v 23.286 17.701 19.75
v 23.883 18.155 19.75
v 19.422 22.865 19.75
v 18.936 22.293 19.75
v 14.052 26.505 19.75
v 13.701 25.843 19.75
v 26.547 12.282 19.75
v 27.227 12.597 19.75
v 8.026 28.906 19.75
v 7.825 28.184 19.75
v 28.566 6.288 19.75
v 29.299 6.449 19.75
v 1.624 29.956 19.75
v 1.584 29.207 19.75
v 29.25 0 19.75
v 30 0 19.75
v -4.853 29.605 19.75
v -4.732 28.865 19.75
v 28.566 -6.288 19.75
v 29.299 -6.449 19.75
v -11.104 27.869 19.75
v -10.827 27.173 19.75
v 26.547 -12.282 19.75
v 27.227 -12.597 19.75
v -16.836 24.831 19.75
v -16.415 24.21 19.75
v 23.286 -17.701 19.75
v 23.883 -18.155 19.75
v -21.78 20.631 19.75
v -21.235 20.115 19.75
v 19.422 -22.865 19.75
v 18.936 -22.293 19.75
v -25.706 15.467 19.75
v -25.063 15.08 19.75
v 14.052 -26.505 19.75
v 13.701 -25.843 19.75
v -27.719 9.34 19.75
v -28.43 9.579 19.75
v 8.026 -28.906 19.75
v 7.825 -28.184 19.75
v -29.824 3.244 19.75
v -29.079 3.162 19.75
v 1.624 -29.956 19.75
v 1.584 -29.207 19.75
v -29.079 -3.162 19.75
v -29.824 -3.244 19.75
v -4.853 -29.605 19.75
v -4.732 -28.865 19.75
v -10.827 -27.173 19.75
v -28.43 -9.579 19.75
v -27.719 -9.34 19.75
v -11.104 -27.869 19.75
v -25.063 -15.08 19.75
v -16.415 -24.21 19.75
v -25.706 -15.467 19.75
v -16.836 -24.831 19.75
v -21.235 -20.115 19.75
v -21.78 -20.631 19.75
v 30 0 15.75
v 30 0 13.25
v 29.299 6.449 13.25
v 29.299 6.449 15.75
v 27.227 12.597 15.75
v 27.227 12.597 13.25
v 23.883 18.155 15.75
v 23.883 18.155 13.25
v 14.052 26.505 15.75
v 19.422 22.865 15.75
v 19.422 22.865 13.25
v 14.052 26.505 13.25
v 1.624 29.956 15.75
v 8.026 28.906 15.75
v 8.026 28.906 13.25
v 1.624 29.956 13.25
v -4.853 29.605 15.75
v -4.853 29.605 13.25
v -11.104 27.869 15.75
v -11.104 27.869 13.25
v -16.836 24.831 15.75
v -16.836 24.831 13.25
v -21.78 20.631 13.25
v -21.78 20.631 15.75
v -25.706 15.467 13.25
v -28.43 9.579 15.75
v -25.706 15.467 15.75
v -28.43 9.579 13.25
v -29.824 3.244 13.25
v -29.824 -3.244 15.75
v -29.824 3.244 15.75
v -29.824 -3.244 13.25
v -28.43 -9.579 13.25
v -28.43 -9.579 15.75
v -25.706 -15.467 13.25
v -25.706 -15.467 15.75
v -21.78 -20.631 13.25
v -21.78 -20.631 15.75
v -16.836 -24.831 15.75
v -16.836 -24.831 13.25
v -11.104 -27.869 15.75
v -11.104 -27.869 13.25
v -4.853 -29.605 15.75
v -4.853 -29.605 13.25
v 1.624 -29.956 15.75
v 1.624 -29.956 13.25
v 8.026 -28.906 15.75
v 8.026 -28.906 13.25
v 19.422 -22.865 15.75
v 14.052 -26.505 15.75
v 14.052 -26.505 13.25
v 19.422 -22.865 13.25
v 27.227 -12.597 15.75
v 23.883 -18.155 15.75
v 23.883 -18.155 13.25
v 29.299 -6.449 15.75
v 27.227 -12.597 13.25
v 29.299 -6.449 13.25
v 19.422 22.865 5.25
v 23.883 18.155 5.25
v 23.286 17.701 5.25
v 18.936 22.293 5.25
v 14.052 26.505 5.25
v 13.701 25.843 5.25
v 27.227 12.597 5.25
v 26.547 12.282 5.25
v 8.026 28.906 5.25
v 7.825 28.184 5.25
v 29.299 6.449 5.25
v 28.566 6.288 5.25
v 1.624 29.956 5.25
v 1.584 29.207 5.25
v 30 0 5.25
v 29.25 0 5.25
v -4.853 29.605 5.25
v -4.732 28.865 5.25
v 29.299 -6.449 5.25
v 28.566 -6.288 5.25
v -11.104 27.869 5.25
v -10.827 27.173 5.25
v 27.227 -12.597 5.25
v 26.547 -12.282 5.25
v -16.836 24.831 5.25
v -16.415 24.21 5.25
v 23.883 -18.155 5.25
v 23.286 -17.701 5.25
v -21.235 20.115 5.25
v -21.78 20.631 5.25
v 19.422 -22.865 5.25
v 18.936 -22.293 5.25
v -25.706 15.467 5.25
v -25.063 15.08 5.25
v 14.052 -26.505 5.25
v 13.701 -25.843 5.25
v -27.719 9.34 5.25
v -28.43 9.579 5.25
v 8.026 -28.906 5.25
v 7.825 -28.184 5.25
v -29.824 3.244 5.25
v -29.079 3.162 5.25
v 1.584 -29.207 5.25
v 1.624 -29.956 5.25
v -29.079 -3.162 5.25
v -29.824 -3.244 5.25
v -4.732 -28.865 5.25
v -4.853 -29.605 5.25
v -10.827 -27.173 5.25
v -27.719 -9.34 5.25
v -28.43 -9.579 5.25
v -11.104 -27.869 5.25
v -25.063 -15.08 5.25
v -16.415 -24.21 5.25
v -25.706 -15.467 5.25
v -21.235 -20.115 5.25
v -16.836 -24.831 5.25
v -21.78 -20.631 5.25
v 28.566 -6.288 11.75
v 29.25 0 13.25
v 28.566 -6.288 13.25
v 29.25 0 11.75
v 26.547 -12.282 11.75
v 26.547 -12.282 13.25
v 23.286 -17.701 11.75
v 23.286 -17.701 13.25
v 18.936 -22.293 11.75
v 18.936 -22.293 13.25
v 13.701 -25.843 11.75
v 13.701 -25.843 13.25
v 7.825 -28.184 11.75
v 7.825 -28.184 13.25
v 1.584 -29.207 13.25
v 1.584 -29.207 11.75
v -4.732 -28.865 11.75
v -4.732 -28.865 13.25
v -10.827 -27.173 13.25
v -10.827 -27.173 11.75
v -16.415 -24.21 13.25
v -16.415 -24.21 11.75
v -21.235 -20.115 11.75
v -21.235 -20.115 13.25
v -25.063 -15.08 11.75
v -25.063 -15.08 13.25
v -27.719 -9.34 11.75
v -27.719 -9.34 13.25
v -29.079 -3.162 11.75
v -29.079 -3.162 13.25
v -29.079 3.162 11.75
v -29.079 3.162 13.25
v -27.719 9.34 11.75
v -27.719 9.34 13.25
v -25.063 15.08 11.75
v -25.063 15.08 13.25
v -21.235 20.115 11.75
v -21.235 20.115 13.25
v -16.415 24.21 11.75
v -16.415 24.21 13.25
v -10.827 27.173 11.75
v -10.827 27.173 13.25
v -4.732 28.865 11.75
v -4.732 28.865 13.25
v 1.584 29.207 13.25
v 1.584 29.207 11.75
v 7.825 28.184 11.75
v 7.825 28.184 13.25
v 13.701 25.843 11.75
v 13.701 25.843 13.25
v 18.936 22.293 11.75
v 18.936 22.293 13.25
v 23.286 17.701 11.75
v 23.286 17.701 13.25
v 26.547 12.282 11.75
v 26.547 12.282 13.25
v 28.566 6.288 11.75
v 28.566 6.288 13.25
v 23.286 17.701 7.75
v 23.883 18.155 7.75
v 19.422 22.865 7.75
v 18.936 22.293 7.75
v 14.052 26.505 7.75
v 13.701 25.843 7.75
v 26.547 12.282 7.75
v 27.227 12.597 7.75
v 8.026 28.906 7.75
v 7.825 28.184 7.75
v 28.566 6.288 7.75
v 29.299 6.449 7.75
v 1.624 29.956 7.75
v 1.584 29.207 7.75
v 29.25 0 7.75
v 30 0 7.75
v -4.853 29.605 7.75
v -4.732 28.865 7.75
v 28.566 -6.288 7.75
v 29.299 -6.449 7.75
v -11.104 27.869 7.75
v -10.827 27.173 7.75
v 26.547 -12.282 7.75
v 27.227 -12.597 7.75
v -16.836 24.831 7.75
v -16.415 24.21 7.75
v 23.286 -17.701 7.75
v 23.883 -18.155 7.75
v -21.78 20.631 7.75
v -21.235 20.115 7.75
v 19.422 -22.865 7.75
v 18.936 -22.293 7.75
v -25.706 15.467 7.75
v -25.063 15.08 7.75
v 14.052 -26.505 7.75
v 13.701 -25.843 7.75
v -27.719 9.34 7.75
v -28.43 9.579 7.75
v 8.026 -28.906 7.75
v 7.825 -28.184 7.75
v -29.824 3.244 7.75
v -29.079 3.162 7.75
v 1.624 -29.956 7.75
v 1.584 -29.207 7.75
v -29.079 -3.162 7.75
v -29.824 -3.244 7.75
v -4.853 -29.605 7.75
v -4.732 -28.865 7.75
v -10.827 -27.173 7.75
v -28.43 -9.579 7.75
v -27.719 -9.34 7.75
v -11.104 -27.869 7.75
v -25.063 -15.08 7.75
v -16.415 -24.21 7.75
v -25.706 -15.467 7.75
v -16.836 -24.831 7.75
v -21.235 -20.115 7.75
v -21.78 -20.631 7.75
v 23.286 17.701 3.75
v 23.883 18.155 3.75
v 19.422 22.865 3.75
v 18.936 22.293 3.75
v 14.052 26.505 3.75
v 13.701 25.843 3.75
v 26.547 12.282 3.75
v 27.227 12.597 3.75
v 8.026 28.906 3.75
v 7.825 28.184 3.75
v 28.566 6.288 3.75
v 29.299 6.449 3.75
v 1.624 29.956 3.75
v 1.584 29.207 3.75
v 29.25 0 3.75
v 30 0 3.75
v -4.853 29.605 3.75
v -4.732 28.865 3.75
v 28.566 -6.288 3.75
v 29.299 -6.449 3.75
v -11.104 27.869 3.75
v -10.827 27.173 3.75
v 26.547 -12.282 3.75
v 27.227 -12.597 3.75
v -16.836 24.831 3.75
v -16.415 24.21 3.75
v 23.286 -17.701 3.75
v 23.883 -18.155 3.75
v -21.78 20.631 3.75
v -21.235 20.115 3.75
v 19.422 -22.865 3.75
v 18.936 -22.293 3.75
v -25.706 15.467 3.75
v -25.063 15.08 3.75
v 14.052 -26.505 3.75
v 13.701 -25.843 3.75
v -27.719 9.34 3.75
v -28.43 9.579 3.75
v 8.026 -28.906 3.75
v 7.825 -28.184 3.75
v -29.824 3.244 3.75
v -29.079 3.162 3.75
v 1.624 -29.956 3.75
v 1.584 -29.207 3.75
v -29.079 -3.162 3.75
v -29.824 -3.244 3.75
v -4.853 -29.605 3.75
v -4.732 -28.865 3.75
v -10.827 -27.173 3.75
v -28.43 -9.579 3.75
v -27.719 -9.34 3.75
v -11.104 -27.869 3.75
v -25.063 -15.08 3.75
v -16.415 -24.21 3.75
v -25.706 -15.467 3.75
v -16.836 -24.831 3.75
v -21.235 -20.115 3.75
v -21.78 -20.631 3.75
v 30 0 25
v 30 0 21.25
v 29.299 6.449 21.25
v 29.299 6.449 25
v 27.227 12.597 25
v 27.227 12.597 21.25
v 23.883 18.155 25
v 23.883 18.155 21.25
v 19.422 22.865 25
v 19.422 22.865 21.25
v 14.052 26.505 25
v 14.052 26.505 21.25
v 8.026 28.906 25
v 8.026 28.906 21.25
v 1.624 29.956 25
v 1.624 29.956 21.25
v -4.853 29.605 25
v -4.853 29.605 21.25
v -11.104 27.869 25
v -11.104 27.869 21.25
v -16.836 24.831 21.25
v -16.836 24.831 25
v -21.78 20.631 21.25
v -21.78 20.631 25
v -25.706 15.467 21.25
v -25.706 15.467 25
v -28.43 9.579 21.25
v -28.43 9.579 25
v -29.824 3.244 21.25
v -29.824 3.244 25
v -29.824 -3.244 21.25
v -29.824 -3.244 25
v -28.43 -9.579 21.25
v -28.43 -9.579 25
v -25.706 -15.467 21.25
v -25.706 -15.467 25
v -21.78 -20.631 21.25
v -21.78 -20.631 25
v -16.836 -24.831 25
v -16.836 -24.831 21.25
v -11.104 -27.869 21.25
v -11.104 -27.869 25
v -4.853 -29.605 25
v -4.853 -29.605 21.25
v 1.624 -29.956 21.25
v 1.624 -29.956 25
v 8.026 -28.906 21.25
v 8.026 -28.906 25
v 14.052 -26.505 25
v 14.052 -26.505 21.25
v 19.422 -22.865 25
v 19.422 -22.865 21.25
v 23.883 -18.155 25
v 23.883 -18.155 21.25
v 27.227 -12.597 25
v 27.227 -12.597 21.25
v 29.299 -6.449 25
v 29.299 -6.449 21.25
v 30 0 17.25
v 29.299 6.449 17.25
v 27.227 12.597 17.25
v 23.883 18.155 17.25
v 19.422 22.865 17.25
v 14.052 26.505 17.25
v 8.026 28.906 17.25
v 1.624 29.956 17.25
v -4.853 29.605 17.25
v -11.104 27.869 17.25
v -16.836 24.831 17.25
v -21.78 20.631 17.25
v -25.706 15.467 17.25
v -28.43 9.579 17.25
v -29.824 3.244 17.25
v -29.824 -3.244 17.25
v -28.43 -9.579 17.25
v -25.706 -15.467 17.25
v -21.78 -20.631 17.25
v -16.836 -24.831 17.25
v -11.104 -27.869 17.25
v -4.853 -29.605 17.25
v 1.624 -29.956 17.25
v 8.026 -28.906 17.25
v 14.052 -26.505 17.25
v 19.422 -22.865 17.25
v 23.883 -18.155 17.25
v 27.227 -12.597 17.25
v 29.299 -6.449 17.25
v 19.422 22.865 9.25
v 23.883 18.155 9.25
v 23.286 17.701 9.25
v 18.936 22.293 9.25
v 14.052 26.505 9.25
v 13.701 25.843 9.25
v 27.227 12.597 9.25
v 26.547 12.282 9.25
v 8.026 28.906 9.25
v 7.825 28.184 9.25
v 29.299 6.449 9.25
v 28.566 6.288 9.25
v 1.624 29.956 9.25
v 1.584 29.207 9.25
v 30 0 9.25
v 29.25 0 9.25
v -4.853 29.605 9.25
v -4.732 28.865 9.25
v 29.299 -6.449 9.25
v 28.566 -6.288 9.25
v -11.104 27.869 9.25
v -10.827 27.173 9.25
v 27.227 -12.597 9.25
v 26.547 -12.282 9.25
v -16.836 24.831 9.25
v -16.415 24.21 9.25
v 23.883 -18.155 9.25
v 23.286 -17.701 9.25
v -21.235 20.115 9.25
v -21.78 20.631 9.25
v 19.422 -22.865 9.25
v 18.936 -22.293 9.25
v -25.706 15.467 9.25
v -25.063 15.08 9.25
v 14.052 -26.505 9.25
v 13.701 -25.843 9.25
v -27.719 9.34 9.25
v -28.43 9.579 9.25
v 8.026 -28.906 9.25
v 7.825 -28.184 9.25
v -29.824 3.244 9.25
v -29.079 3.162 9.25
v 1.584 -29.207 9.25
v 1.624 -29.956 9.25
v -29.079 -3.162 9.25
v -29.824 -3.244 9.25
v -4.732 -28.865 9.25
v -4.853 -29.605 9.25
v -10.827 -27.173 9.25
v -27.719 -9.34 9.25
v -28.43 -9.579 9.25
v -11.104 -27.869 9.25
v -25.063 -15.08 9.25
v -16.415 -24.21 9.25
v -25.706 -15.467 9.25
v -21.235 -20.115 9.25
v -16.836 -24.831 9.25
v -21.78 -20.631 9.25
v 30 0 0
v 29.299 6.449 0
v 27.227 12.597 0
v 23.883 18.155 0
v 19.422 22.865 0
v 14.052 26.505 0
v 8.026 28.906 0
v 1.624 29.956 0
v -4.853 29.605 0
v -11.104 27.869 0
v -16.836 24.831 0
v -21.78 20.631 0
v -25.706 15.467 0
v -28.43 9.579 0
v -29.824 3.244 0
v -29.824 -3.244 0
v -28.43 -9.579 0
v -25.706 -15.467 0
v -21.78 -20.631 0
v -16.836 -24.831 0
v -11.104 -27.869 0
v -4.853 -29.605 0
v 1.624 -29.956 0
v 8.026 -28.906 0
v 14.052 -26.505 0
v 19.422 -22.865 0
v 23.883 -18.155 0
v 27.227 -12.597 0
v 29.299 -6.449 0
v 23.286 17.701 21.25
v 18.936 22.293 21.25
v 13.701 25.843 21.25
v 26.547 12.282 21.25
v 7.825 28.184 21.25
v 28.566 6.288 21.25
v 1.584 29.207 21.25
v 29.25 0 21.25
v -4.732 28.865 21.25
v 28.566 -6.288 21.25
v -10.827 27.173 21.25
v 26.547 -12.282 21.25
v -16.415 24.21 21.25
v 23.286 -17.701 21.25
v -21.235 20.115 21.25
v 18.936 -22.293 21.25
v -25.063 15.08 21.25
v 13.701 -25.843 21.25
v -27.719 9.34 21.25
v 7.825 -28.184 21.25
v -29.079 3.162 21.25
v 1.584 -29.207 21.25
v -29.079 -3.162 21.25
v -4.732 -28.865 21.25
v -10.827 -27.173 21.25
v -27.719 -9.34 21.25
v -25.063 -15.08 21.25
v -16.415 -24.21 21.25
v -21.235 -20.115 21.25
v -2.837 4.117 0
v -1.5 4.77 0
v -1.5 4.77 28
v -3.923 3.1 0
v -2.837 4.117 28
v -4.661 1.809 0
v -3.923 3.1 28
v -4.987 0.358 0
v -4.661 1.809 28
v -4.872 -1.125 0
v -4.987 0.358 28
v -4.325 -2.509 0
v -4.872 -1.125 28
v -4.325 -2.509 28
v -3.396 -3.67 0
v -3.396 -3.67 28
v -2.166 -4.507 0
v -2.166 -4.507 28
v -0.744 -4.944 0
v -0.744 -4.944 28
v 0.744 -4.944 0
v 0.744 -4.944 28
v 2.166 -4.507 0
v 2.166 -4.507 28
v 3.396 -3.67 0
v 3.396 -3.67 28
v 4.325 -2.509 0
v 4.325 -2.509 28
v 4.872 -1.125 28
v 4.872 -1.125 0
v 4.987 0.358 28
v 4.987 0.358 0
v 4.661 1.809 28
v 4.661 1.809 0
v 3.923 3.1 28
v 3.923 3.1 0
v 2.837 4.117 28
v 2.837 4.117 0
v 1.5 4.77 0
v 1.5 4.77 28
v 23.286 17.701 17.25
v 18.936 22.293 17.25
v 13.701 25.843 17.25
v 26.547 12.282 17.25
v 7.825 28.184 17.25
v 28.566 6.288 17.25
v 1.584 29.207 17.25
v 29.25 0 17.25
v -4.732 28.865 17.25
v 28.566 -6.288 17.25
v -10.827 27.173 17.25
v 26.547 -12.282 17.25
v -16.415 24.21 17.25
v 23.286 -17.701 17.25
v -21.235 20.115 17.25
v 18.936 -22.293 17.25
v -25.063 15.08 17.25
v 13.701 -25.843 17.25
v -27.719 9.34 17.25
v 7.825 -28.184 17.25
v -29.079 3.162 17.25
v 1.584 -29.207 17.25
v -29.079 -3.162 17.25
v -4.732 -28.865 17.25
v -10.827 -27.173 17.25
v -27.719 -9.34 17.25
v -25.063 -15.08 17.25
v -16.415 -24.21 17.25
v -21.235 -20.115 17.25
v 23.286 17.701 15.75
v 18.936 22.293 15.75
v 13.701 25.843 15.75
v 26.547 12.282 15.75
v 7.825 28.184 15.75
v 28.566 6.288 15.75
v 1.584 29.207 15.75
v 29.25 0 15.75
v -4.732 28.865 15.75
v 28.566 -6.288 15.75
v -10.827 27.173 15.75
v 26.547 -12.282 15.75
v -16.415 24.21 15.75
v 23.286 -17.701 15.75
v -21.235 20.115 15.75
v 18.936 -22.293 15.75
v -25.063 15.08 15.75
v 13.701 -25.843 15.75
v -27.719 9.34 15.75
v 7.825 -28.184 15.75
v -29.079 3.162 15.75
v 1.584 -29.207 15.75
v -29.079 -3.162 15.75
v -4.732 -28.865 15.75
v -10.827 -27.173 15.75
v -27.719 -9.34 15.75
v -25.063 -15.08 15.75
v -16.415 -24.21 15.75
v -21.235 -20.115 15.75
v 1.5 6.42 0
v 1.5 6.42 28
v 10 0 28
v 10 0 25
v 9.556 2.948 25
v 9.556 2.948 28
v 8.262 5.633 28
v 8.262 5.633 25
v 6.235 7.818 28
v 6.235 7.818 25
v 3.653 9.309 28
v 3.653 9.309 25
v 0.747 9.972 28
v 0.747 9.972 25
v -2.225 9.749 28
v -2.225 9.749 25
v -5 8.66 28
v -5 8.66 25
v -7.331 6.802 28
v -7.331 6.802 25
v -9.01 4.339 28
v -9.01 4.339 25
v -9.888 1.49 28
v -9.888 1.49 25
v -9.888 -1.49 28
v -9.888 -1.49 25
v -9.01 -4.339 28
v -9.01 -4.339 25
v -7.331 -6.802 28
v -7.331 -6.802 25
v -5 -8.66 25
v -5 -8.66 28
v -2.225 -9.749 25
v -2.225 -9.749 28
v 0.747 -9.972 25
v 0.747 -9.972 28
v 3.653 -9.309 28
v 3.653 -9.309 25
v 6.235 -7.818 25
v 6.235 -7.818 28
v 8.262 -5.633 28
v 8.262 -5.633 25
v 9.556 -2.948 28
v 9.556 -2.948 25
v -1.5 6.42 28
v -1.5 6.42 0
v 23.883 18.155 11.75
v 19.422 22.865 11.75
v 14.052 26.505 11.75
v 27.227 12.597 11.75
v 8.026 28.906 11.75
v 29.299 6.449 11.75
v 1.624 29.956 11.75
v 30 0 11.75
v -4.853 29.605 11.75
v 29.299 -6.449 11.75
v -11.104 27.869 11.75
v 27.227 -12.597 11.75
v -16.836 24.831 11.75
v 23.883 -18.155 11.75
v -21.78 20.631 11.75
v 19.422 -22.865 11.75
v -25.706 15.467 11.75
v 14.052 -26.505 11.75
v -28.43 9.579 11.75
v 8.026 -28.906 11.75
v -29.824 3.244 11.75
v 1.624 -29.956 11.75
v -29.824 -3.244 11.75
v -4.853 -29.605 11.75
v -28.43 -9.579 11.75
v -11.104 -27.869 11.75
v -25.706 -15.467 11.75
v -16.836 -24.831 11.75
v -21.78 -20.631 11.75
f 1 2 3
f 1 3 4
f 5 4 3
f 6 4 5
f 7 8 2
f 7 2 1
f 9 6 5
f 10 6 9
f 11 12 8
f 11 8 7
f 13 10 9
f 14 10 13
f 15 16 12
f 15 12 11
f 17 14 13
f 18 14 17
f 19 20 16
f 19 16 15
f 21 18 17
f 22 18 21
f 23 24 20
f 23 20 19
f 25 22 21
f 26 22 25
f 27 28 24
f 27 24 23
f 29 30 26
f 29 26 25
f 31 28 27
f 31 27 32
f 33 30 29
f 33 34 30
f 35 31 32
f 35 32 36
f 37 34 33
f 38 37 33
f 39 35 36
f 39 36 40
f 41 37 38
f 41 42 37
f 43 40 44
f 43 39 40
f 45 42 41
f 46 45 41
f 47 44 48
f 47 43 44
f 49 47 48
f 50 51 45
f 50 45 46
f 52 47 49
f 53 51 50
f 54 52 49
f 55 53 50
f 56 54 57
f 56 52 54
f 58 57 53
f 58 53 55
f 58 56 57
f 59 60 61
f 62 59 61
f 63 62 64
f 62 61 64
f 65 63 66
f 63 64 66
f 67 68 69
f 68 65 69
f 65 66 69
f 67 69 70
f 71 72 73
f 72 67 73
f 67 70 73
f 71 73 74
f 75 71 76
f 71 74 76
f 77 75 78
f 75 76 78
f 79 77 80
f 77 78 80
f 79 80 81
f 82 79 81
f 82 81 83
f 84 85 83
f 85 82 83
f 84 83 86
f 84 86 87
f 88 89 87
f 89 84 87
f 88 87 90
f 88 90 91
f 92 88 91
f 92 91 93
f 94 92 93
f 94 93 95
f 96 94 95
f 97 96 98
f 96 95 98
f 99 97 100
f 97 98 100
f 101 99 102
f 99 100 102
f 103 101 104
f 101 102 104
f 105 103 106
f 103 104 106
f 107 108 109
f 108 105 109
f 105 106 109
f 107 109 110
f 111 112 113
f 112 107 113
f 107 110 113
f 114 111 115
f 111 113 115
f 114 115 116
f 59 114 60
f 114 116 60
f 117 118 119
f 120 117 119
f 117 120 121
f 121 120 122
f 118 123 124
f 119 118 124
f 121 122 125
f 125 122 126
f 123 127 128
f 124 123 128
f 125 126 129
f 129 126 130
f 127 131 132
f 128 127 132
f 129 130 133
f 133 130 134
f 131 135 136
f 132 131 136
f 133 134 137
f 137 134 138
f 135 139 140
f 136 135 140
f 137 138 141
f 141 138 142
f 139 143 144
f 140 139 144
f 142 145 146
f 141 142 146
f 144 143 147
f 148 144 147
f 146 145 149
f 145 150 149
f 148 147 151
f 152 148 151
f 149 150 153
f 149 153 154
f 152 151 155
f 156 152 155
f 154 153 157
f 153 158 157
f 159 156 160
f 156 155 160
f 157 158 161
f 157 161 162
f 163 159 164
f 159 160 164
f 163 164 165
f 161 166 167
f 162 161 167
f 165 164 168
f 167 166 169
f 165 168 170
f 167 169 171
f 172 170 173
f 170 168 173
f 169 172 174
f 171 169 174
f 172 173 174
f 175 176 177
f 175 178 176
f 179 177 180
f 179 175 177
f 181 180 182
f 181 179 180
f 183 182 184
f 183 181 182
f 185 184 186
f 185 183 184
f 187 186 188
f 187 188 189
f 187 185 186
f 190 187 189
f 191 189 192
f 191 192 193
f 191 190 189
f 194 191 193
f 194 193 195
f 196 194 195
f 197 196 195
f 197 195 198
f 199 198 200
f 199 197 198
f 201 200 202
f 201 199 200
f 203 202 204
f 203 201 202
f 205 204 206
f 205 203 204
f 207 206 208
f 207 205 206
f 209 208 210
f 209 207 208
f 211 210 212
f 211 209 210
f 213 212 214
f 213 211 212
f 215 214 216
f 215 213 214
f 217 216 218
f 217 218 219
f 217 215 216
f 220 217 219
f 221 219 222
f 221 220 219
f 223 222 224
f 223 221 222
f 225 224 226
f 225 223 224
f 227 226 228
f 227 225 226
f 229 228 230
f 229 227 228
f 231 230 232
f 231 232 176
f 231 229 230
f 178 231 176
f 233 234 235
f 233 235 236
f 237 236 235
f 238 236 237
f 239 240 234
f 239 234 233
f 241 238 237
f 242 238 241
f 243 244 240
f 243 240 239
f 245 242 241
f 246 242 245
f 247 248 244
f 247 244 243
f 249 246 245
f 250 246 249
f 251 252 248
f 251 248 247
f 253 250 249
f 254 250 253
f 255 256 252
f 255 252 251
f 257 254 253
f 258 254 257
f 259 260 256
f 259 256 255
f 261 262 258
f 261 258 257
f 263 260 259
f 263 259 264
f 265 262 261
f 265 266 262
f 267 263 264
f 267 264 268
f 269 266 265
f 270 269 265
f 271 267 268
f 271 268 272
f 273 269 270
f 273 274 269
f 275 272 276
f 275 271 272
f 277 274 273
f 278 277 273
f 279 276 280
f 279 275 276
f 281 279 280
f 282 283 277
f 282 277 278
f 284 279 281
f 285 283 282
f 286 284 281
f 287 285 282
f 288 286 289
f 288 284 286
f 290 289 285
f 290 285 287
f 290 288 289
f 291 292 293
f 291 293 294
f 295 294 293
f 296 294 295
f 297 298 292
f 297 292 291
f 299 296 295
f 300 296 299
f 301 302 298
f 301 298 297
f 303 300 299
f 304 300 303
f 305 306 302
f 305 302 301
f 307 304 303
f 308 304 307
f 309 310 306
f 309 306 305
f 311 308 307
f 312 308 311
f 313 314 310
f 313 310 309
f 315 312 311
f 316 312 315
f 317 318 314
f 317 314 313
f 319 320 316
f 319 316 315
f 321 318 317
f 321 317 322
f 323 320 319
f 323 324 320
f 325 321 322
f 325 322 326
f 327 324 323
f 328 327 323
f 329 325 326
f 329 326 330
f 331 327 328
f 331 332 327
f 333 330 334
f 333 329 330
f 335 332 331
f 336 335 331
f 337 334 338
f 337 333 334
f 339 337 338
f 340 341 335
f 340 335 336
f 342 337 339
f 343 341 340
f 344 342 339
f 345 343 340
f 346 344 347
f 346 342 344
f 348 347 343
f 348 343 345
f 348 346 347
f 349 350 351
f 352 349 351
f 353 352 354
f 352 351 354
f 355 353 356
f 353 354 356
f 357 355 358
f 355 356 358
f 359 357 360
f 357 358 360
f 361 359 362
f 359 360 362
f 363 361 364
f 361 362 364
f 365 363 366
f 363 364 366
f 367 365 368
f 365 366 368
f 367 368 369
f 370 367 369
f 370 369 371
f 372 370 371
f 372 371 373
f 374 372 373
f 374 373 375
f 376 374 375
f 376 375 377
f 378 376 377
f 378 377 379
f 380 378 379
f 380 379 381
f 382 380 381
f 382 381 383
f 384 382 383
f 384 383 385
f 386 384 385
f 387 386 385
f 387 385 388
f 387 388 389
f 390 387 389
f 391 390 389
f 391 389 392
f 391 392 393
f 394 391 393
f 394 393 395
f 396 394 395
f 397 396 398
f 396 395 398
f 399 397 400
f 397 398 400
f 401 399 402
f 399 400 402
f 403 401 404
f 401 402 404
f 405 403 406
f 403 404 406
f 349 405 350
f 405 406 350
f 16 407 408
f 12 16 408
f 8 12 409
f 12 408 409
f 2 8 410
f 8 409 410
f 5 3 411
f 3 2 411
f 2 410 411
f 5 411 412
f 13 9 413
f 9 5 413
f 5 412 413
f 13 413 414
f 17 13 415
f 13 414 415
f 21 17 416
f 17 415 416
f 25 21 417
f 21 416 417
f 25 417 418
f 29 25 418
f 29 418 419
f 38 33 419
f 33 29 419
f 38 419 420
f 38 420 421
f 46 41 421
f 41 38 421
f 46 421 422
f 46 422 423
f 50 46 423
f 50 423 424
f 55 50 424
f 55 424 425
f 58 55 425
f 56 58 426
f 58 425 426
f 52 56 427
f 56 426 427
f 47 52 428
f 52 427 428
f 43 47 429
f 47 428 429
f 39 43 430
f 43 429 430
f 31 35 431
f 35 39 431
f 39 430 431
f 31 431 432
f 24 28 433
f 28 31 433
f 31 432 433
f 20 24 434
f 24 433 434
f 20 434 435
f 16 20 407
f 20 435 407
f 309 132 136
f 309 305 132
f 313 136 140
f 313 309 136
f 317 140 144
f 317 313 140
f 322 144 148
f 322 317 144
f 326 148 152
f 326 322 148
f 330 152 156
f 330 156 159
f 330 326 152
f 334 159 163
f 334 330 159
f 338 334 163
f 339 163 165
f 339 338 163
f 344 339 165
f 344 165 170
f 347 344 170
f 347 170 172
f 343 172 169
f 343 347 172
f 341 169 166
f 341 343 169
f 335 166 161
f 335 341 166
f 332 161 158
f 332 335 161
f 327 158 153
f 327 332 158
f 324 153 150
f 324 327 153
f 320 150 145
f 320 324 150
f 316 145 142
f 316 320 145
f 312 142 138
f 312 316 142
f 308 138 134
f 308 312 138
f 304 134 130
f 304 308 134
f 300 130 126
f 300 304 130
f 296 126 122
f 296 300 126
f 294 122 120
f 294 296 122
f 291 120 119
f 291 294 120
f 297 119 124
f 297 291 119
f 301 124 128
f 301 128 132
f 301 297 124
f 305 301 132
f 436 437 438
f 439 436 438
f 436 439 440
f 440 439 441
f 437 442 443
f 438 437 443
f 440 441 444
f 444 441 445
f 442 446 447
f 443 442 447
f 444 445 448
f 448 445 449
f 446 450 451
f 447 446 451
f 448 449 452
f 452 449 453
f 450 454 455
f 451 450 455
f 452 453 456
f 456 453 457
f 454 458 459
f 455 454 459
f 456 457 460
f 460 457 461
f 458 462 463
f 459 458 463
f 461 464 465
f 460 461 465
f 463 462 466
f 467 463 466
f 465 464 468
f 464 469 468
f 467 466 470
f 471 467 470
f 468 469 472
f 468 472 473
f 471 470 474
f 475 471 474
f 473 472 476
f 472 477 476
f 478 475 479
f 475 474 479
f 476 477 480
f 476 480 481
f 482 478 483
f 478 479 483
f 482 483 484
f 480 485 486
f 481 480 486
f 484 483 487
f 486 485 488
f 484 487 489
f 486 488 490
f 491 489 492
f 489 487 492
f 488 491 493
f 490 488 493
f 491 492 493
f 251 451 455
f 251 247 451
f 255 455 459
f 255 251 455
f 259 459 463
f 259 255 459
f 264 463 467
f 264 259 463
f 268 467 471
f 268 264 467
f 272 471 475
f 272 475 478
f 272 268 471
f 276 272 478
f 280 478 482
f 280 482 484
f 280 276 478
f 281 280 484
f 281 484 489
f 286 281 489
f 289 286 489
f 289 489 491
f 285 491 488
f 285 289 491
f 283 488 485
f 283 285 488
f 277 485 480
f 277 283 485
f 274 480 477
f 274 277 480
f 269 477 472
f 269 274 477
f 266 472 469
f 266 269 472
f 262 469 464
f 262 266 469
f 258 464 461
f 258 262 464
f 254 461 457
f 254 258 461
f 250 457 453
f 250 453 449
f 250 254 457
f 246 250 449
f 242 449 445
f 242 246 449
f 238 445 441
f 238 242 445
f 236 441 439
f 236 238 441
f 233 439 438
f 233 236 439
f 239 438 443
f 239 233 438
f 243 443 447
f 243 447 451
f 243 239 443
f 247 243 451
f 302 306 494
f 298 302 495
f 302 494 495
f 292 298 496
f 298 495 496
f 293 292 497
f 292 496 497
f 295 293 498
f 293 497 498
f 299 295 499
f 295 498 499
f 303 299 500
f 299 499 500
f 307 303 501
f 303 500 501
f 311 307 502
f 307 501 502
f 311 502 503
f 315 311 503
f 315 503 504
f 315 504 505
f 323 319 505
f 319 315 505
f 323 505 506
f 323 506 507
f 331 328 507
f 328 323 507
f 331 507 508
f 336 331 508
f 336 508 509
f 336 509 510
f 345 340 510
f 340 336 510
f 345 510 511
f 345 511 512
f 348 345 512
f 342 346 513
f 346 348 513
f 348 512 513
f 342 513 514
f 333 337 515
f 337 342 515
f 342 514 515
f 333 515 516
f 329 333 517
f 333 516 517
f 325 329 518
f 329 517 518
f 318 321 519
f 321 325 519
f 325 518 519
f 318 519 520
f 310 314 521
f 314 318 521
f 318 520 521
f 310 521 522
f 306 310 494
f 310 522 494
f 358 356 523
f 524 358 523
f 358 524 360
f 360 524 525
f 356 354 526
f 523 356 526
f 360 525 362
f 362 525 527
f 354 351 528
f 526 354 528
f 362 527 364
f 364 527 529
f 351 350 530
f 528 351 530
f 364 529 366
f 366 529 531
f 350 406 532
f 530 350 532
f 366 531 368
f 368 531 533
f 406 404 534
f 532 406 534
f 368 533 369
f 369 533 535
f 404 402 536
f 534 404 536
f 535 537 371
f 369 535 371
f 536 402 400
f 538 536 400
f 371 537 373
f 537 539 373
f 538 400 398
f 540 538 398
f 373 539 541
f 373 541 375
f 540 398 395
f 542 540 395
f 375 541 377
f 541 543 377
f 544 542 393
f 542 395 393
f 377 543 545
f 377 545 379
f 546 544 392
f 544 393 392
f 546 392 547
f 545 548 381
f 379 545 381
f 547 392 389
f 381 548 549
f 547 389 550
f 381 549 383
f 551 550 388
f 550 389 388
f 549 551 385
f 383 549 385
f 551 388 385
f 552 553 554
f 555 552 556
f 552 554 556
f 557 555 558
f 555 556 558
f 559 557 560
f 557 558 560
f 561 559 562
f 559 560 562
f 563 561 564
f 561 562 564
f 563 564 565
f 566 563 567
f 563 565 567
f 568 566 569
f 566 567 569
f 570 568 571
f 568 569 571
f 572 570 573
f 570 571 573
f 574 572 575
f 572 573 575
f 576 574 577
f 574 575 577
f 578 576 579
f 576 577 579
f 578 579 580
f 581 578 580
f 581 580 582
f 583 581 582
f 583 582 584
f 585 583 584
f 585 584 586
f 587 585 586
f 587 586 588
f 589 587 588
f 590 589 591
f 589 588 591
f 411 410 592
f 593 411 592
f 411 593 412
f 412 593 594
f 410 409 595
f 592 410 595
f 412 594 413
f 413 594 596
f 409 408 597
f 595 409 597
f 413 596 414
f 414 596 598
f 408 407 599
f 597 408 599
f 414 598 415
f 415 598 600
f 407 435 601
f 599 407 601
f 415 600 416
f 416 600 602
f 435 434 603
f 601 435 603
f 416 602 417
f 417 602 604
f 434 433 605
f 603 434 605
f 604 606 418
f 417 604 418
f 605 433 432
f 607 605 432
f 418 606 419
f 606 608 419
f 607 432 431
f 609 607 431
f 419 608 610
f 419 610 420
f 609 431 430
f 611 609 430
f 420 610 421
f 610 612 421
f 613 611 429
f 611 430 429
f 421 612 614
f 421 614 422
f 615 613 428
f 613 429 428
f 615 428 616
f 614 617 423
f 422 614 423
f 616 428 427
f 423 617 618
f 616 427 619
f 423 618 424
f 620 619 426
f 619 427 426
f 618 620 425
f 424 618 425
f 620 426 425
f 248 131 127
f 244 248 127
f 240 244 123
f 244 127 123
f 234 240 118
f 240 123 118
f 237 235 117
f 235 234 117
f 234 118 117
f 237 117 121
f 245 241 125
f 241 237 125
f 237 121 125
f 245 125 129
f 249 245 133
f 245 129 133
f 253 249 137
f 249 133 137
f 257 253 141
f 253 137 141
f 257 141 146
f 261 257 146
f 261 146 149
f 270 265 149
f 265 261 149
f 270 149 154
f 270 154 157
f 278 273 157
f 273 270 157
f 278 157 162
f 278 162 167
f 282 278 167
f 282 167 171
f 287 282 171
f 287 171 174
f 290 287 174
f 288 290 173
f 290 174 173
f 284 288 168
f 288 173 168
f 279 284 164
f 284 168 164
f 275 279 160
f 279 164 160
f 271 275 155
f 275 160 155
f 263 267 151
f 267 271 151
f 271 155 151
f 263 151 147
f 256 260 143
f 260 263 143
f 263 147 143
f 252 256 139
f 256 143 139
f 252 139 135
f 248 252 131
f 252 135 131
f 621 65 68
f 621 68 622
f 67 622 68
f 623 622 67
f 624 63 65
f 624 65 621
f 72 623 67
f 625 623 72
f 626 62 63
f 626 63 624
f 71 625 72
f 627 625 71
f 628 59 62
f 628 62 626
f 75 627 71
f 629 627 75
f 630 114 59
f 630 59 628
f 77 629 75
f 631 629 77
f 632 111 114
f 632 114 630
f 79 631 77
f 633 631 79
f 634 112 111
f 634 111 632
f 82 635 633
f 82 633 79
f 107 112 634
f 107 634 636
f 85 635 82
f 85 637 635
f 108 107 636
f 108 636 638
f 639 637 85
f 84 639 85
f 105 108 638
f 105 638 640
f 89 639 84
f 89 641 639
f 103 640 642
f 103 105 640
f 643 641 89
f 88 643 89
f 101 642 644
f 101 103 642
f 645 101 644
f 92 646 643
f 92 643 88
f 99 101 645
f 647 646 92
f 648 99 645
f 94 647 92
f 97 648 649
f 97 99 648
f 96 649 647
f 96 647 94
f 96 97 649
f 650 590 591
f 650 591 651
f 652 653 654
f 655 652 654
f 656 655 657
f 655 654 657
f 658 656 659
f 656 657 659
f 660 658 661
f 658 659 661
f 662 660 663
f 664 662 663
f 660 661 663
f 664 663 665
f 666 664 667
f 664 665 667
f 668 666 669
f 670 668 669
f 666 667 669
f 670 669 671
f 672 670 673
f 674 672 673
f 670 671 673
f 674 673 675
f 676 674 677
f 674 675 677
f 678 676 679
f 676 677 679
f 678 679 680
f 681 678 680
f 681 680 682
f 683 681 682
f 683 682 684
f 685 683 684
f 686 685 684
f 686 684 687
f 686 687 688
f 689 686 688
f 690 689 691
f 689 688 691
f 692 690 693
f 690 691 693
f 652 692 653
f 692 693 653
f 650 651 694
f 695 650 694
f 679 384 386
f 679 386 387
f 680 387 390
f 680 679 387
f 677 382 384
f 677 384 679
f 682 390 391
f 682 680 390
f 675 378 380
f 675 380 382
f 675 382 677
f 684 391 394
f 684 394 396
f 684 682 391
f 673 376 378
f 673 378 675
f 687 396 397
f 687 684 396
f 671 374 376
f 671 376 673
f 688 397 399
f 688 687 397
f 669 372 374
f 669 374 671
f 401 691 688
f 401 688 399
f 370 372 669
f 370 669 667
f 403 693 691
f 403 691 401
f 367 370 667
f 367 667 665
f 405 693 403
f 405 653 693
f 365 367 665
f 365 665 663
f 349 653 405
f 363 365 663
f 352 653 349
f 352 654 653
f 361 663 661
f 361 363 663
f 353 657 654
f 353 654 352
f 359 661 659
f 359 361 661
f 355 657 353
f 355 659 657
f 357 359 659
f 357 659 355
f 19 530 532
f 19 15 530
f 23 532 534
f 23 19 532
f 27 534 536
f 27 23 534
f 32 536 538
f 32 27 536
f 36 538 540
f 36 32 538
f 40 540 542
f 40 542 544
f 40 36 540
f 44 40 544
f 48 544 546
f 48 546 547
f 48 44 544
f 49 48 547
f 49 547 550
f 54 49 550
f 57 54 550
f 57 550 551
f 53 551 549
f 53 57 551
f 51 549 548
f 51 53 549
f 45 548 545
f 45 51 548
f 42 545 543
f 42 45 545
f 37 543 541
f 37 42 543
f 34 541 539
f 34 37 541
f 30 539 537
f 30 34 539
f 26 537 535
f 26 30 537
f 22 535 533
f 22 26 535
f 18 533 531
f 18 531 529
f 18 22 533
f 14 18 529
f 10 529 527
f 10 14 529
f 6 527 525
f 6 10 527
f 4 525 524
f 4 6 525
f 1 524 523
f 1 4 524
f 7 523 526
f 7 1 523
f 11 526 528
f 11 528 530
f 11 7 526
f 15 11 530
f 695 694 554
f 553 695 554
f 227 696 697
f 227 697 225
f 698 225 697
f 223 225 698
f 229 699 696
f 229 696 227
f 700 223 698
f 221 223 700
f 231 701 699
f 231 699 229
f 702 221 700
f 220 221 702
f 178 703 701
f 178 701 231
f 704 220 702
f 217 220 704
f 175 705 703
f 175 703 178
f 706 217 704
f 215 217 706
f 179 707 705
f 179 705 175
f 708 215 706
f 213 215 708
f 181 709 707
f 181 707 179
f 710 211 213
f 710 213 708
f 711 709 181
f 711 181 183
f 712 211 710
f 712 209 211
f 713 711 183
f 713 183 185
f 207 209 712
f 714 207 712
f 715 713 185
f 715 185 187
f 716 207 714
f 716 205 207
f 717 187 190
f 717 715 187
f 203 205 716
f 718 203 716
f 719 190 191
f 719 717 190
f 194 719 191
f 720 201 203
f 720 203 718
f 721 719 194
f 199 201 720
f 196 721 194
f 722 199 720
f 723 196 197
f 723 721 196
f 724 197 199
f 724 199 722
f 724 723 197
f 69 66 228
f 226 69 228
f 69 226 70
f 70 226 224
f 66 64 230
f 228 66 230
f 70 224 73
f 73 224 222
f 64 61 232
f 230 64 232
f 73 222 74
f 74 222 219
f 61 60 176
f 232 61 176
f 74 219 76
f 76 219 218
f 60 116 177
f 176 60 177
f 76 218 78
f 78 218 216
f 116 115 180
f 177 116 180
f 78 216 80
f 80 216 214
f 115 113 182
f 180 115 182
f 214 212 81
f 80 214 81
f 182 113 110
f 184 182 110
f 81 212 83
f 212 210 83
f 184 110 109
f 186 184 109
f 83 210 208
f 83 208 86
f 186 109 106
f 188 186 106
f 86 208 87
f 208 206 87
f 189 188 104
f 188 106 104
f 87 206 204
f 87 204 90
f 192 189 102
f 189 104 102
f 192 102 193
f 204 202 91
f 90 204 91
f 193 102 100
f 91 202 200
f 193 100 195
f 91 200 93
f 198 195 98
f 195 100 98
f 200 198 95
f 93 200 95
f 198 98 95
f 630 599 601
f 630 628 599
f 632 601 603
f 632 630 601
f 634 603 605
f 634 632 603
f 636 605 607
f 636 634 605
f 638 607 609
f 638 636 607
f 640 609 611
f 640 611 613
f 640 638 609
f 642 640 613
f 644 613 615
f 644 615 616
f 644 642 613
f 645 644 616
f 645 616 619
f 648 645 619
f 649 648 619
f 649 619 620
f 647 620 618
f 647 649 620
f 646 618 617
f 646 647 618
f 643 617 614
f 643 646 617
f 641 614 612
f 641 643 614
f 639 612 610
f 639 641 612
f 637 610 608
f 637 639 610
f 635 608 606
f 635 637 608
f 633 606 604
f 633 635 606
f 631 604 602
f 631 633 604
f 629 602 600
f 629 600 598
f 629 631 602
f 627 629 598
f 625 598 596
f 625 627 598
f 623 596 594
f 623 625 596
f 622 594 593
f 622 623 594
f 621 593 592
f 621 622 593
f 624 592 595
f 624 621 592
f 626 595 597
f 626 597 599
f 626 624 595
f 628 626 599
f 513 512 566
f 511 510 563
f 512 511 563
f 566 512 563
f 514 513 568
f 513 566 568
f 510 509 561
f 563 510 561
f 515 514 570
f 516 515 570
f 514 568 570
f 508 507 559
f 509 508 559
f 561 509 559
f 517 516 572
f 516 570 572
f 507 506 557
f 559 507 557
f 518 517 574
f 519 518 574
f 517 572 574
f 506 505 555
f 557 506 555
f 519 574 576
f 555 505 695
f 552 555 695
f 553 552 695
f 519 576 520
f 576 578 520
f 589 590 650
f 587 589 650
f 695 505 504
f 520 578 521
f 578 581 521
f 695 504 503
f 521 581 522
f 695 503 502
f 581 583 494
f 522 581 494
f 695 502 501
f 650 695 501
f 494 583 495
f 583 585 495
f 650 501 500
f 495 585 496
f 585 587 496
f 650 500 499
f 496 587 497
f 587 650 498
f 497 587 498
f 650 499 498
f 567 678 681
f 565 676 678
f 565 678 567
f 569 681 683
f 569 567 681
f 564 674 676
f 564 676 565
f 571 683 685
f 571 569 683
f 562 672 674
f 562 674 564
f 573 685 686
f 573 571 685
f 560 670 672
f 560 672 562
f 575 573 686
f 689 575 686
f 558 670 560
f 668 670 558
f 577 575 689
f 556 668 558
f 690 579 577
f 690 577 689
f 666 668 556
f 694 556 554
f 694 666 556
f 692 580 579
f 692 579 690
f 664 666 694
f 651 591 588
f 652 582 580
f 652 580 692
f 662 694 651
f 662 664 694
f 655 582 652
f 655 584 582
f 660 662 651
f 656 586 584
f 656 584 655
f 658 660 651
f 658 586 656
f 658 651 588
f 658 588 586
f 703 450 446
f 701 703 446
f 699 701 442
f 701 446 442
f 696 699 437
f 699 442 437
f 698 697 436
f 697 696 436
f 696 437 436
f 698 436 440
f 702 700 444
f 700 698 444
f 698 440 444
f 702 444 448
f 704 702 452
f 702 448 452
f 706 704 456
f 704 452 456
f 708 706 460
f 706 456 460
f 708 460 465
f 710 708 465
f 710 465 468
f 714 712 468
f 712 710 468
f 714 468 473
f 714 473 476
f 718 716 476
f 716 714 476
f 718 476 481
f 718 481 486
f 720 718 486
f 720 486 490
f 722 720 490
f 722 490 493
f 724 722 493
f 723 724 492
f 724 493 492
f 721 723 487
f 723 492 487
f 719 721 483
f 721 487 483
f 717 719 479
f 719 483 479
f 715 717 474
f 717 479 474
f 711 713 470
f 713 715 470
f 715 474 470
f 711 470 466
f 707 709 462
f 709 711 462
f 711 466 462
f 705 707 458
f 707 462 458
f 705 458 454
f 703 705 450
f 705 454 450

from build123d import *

# Parameters (mm, degrees)
SKETCH1_R               = 30
BOSS_EXTRUDE1_DEPTH     = 25
CUT_EXTRUDE1_DEPTH      = 1
CUT_EXTRUDE1_DEPTH_BACK = 43
SKETCH2_R               = 5
SKETCH3_W               = 1.5
SKETCH3_H               = 1.5
SKETCH5_R               = 10
BOSS_EXTRUDE2_DEPTH     = 3
SKETCH6_R               = 5
CUT_EXTRUDE3_DEPTH      = 3
CUT_EXTRUDE4_START      = -38
CUT_EXTRUDE4_DEPTH      = 38


with BuildPart() as part:
    # Sketch1 → Boss-Extrude1 (new body)
    with BuildSketch(Plane.XY):
        Circle(SKETCH1_R)
    extrude(amount=BOSS_EXTRUDE1_DEPTH)

    # Sketch2 → Cut-Extrude1 (cut, two sides: drawn at the far end of the back side and taken through both)
    with BuildSketch(Plane.XY.offset(25).offset(-CUT_EXTRUDE1_DEPTH_BACK)):
        Circle(SKETCH2_R)
    extrude(amount=CUT_EXTRUDE1_DEPTH + CUT_EXTRUDE1_DEPTH_BACK, mode=Mode.SUBTRACT)

    # Sketch3 → Cut-Revolve2 (revolve, cut)
    with BuildSketch(Plane(origin=(0, 0, 0), x_dir=(0, 0, -1), z_dir=(1, 0, 0)), mode=Mode.PRIVATE) as cut_revolve2_sk:
        with Locations((-12.5, 30)):
            Rectangle(SKETCH3_W, SKETCH3_H)
        with Locations((-8.5, 30)):
            Rectangle(SKETCH3_W, SKETCH3_H)
        with Locations((-4.5, 30)):
            Rectangle(SKETCH3_W, SKETCH3_H)
        with Locations((-16.5, 30)):
            Rectangle(SKETCH3_W, SKETCH3_H)
        with Locations((-20.5, 30)):
            Rectangle(SKETCH3_W, SKETCH3_H)
    revolve(cut_revolve2_sk.sketch.rotate(Axis((0, 0, 25), (0, 0, -1)), 90), axis=Axis((0, 0, 25), (0, 0, -1)), mode=Mode.SUBTRACT)

    # Sketch5 → Boss-Extrude2 (add)
    with BuildSketch(Plane.XY.offset(25)):
        Circle(SKETCH5_R)
    extrude(amount=BOSS_EXTRUDE2_DEPTH)

    # Sketch6 → Cut-Extrude3 (cut)
    with BuildSketch(Plane.XY.offset(28)):
        Circle(SKETCH6_R)
    extrude(amount=-CUT_EXTRUDE3_DEPTH, mode=Mode.SUBTRACT)

    # Sketch7 → Cut-Extrude4 (cut)
    with BuildSketch(Plane(origin=(0, 0, 0), x_dir=(-1, 0, 0), z_dir=(0, 0, -1)).offset(CUT_EXTRUDE4_START)):
        with BuildLine():
            Line((-1.5, 6.419696007), (1.5, 6.419696007))
            Line((1.5, 6.419696007), (1.5, 4.769696007))
            ThreePointArc((1.5, 4.769696007), (0, 5), (-1.5, 4.769696007))
            Line((-1.5, 4.769696007), (-1.5, 6.419696007))
        make_face()
    extrude(amount=CUT_EXTRUDE4_DEPTH, mode=Mode.SUBTRACT)


solid = part.part
